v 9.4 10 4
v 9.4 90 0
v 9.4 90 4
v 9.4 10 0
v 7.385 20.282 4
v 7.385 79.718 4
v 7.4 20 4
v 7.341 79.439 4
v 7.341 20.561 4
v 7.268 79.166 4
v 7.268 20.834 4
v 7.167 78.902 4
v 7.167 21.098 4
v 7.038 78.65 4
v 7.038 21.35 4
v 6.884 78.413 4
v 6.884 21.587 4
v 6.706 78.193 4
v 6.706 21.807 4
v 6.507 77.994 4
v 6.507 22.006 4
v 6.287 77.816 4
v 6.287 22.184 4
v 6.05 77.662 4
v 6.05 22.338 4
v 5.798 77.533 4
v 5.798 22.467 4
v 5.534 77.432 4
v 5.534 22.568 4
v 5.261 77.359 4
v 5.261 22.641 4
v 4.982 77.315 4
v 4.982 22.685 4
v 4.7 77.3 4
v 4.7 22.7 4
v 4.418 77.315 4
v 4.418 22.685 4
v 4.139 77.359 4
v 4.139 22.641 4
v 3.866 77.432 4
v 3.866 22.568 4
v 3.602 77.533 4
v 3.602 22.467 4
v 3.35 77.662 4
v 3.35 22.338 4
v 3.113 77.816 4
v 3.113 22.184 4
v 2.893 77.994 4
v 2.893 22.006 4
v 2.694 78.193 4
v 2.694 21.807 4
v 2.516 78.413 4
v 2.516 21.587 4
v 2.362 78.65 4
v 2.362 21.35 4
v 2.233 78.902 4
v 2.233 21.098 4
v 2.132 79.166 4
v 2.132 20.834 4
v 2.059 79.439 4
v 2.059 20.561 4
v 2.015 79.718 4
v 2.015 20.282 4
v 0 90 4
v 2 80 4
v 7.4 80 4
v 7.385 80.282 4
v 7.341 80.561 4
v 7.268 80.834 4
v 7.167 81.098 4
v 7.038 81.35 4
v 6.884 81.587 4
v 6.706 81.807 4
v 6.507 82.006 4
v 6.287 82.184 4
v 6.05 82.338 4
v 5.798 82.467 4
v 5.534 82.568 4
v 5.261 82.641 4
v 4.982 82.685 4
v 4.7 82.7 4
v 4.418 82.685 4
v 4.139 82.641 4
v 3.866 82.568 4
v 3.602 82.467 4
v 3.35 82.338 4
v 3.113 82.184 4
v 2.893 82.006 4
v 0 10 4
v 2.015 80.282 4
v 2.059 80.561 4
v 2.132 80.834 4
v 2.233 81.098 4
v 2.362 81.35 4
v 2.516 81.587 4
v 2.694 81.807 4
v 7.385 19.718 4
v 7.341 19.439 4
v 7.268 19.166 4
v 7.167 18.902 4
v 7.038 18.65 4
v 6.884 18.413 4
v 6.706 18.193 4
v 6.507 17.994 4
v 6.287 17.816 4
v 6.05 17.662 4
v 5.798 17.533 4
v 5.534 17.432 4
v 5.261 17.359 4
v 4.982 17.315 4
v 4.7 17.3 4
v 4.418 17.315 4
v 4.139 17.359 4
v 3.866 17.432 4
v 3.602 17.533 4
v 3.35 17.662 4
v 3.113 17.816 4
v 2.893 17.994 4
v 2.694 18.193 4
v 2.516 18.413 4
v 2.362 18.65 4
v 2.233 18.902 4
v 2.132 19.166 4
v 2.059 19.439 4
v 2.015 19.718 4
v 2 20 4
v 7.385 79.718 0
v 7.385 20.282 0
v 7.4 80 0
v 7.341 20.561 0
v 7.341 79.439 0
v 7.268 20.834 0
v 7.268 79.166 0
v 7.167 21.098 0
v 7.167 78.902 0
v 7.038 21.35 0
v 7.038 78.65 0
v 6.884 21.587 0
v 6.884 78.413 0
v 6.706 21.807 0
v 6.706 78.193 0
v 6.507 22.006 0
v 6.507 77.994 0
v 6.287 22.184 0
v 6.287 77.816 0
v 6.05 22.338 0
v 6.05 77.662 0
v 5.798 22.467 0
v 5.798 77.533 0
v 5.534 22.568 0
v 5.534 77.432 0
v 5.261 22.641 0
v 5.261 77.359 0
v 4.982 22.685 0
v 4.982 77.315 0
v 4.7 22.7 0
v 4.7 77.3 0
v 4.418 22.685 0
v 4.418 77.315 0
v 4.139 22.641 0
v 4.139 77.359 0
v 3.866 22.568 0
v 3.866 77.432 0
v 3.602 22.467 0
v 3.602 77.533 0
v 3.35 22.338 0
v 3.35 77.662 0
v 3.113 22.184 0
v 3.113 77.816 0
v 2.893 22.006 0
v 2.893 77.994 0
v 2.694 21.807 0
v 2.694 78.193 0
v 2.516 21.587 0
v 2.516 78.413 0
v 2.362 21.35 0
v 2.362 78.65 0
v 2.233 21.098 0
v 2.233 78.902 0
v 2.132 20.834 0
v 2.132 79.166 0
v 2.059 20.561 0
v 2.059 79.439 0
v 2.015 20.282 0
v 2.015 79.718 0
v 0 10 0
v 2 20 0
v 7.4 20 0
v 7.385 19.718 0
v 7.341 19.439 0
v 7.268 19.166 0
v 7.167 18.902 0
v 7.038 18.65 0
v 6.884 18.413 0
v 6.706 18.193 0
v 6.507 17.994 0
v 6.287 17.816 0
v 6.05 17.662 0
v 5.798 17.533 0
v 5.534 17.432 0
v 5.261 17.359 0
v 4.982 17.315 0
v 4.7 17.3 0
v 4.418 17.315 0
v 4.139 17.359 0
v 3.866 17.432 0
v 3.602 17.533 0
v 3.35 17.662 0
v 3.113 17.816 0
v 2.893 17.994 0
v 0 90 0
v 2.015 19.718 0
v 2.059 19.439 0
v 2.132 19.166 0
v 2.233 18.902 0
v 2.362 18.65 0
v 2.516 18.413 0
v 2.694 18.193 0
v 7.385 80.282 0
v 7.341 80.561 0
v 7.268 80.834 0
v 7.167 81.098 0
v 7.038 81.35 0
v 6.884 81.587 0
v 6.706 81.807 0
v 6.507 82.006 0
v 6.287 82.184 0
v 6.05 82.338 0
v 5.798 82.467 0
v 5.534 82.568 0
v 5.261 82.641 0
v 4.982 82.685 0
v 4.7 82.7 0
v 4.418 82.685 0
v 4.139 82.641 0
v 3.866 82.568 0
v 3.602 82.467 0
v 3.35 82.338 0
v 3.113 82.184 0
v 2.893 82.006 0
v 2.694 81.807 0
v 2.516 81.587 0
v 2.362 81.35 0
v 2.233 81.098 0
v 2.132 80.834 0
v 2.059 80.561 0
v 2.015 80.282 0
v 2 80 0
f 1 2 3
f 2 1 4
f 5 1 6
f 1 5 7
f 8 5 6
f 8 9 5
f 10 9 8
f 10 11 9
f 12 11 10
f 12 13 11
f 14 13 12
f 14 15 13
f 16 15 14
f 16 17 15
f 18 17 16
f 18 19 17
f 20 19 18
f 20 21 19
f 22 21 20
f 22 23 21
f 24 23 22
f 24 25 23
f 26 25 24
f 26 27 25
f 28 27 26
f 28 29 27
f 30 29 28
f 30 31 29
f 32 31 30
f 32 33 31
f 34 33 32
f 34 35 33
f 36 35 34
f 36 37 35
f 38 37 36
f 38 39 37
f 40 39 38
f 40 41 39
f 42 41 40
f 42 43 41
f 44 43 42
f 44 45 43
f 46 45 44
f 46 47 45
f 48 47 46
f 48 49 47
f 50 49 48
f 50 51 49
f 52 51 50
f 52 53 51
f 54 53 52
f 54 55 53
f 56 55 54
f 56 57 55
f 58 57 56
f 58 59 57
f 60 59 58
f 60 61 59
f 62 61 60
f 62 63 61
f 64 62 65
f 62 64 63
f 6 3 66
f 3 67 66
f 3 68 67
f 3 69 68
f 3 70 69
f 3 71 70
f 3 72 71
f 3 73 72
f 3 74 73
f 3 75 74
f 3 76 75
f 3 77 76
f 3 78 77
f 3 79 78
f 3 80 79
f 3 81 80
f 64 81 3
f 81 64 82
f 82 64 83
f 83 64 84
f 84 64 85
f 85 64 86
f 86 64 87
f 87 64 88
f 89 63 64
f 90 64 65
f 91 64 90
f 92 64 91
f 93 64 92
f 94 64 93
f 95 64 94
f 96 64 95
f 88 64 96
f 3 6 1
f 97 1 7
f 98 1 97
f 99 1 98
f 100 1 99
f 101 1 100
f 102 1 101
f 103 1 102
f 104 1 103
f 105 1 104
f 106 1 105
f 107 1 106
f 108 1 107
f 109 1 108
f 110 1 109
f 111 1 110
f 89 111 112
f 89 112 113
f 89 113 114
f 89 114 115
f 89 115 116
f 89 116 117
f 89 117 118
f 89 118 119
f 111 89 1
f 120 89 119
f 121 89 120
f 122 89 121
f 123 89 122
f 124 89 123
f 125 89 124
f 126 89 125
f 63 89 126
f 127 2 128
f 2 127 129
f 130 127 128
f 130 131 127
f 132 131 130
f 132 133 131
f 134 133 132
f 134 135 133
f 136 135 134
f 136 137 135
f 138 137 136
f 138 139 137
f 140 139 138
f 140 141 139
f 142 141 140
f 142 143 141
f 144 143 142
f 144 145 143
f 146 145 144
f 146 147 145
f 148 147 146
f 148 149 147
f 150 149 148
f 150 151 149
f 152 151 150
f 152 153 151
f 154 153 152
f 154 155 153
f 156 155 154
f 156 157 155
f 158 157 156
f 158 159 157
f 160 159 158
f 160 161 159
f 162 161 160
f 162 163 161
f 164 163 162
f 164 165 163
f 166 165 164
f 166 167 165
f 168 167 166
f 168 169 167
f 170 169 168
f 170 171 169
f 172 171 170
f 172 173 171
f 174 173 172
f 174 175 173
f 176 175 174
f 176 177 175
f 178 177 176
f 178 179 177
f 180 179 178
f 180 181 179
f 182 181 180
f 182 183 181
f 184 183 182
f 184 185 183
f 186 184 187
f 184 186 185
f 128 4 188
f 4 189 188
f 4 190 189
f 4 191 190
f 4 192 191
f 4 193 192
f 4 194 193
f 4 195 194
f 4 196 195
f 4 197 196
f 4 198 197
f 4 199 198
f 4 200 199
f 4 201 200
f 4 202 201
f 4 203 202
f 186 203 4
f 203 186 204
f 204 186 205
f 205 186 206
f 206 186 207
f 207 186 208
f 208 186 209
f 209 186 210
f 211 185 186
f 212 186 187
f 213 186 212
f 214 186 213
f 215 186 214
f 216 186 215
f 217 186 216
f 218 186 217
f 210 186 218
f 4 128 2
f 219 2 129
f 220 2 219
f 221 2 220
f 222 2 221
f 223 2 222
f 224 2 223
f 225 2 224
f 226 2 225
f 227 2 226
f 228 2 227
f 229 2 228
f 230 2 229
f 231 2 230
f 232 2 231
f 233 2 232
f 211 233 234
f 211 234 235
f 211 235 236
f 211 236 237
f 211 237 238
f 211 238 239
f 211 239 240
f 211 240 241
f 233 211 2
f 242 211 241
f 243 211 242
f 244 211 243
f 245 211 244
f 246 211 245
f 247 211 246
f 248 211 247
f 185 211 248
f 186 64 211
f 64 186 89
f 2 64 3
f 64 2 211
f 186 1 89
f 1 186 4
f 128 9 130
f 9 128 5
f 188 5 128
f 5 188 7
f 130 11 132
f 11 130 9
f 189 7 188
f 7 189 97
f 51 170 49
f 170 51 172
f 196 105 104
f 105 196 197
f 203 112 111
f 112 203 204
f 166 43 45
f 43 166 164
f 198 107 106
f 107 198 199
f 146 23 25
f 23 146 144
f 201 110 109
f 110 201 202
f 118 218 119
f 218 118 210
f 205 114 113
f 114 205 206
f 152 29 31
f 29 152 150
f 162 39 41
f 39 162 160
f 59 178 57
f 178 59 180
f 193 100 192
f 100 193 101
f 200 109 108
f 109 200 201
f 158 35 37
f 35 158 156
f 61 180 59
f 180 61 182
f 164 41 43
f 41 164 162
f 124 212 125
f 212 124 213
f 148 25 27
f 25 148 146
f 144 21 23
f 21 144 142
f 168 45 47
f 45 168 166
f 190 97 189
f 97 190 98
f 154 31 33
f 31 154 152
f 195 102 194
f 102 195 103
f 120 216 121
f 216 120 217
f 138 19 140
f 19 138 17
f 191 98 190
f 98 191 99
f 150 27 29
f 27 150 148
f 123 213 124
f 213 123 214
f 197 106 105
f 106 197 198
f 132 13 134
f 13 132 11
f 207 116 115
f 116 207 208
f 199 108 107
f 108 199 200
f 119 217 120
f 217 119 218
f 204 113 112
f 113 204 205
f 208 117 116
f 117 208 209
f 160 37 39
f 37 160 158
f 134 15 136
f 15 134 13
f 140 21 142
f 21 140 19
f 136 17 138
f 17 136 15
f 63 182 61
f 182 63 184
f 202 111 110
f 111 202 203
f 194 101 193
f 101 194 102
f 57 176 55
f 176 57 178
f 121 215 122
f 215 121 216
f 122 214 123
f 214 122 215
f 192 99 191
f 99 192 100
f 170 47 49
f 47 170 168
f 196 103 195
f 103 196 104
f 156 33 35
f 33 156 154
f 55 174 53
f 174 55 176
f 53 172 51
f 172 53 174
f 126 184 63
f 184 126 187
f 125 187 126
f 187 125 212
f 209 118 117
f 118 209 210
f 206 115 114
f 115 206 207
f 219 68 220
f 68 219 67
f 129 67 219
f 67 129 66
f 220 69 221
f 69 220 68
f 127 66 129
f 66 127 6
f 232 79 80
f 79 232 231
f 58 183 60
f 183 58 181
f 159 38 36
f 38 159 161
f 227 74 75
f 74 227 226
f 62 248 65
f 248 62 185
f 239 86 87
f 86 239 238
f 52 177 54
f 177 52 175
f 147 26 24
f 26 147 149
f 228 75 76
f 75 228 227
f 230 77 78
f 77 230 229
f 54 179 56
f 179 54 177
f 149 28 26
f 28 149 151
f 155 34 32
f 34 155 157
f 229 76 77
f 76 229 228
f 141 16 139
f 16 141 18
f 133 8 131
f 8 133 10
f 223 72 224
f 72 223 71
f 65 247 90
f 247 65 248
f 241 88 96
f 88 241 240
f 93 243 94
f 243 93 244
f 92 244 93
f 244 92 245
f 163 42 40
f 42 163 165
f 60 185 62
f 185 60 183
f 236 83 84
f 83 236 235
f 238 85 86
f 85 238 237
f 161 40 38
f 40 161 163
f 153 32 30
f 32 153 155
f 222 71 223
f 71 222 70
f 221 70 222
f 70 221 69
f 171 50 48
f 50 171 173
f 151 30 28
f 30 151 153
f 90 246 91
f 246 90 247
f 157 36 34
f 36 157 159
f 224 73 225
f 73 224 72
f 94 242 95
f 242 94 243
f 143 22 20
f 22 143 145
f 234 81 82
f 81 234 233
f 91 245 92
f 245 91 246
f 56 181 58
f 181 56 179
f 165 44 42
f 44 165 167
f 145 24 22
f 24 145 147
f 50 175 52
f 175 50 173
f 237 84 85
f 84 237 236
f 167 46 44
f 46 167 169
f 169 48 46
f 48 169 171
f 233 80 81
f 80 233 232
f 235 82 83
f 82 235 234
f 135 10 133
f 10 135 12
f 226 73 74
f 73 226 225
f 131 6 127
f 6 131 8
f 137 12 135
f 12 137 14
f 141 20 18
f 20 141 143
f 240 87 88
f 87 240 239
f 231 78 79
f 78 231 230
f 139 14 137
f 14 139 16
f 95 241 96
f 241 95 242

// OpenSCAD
th = 0.2;
r_sm = 10/2+th;
r_lg = 15/2+th;
t = 2;
hole_sep = 60;

screw_r = 5/2 + th;
screw_mount_l = 10;
screw_mount_h = 15;

nut_w = 11+th;
nut_h = 4+th;

l = 100;
h = 2*(r_lg+t);
w = 2*(screw_r+2*t);

$fn = 60;

module main_mount() {
difference() {
union() {
cube([w, l, h]);
translate([0,l-screw_mount_l,h]){
cube([w,screw_mount_l,screw_mount_h]);
translate([w/2,0,screw_mount_h])
rotate(a=[-90,0,0])
cylinder(r=w/2,h=screw_mount_l);
}

translate([0,0,h]) {
cube([w,screw_mount_l,screw_mount_h]);
translate([w/2,0,screw_mount_h])
rotate(a=[-90,0,0])
cylinder(r=w/2,h=screw_mount_l);
}
}

translate([w/2,l-screw_mount_l,h+screw_mount_h-t])
rotate(a=[-90,0,0])
cylinder(r=screw_r,h=screw_mount_l);

translate([w/2,0,h+screw_mount_h-t])
rotate(a=[-90,0,0])
cylinder(r=screw_r,h=screw_mount_l);

// Hole for small end of stick
translate([0,(l-hole_sep)/2,r_sm + (h-(2*r_sm))/2])
rotate(a=[0,90,0])
cylinder(r=r_sm, h=w-t);

// Hole for large end of stick
translate([0,(l-hole_sep)/2+hole_sep,r_lg + (h-(2*r_lg))/2])
rotate(a=[0,90,0])
cylinder(r=r_lg, h=w-t);

// Holes for screws
translate([w/2-t,(l-hole_sep)/2,0])
cylinder(r=screw_r,h=h);
translate([w/2-t,(l-hole_sep)/2+hole_sep,0])
cylinder(r=screw_r,h=h);
}
}

module screw_mount() {
difference() {
union() {
translate([-nut_w/2-t,(l-2*(t+screw_mount_l)-nut_w-2*t)/2,0])
cube([nut_w+2*t,nut_w+2*t,nut_h+w/4+t]);
rotate(a=[-90,0,0])
cylinder(h=l-2*(t+screw_mount_l),r=w/2);
}
translate([-nut_w/2-t,(l-2*(t+screw_mount_l)-nut_w)/2,w/2-t]){
cube([nut_w,nut_w,nut_h]);
translate([w/4+t,t+w/4,t])
cylinder(h=nut_h,r=screw_r);
}
rotate(a=[-90,0,0])
cylinder(h=l-2*(t+screw_mount_l),r=screw_r);
}
}

module belt_gripper() {
difference() {
translate([0,screw_mount_l,0])
cube([w-2*t,l-2*screw_mount_l,2*t]);
// Holes for screws
translate([w/2-t,(l-hole_sep)/2,0])
cylinder(r=screw_r,h=h);
translate([w/2-t,(l-hole_sep)/2+hole_sep,0])
cylinder(r=screw_r,h=h);
}
}

//main_mount();

//translate([w/2,t+screw_mount_l,screw_mount_h*2.1])
//screw_mount();

//translate([0,0,-5*t])
belt_gripper();
